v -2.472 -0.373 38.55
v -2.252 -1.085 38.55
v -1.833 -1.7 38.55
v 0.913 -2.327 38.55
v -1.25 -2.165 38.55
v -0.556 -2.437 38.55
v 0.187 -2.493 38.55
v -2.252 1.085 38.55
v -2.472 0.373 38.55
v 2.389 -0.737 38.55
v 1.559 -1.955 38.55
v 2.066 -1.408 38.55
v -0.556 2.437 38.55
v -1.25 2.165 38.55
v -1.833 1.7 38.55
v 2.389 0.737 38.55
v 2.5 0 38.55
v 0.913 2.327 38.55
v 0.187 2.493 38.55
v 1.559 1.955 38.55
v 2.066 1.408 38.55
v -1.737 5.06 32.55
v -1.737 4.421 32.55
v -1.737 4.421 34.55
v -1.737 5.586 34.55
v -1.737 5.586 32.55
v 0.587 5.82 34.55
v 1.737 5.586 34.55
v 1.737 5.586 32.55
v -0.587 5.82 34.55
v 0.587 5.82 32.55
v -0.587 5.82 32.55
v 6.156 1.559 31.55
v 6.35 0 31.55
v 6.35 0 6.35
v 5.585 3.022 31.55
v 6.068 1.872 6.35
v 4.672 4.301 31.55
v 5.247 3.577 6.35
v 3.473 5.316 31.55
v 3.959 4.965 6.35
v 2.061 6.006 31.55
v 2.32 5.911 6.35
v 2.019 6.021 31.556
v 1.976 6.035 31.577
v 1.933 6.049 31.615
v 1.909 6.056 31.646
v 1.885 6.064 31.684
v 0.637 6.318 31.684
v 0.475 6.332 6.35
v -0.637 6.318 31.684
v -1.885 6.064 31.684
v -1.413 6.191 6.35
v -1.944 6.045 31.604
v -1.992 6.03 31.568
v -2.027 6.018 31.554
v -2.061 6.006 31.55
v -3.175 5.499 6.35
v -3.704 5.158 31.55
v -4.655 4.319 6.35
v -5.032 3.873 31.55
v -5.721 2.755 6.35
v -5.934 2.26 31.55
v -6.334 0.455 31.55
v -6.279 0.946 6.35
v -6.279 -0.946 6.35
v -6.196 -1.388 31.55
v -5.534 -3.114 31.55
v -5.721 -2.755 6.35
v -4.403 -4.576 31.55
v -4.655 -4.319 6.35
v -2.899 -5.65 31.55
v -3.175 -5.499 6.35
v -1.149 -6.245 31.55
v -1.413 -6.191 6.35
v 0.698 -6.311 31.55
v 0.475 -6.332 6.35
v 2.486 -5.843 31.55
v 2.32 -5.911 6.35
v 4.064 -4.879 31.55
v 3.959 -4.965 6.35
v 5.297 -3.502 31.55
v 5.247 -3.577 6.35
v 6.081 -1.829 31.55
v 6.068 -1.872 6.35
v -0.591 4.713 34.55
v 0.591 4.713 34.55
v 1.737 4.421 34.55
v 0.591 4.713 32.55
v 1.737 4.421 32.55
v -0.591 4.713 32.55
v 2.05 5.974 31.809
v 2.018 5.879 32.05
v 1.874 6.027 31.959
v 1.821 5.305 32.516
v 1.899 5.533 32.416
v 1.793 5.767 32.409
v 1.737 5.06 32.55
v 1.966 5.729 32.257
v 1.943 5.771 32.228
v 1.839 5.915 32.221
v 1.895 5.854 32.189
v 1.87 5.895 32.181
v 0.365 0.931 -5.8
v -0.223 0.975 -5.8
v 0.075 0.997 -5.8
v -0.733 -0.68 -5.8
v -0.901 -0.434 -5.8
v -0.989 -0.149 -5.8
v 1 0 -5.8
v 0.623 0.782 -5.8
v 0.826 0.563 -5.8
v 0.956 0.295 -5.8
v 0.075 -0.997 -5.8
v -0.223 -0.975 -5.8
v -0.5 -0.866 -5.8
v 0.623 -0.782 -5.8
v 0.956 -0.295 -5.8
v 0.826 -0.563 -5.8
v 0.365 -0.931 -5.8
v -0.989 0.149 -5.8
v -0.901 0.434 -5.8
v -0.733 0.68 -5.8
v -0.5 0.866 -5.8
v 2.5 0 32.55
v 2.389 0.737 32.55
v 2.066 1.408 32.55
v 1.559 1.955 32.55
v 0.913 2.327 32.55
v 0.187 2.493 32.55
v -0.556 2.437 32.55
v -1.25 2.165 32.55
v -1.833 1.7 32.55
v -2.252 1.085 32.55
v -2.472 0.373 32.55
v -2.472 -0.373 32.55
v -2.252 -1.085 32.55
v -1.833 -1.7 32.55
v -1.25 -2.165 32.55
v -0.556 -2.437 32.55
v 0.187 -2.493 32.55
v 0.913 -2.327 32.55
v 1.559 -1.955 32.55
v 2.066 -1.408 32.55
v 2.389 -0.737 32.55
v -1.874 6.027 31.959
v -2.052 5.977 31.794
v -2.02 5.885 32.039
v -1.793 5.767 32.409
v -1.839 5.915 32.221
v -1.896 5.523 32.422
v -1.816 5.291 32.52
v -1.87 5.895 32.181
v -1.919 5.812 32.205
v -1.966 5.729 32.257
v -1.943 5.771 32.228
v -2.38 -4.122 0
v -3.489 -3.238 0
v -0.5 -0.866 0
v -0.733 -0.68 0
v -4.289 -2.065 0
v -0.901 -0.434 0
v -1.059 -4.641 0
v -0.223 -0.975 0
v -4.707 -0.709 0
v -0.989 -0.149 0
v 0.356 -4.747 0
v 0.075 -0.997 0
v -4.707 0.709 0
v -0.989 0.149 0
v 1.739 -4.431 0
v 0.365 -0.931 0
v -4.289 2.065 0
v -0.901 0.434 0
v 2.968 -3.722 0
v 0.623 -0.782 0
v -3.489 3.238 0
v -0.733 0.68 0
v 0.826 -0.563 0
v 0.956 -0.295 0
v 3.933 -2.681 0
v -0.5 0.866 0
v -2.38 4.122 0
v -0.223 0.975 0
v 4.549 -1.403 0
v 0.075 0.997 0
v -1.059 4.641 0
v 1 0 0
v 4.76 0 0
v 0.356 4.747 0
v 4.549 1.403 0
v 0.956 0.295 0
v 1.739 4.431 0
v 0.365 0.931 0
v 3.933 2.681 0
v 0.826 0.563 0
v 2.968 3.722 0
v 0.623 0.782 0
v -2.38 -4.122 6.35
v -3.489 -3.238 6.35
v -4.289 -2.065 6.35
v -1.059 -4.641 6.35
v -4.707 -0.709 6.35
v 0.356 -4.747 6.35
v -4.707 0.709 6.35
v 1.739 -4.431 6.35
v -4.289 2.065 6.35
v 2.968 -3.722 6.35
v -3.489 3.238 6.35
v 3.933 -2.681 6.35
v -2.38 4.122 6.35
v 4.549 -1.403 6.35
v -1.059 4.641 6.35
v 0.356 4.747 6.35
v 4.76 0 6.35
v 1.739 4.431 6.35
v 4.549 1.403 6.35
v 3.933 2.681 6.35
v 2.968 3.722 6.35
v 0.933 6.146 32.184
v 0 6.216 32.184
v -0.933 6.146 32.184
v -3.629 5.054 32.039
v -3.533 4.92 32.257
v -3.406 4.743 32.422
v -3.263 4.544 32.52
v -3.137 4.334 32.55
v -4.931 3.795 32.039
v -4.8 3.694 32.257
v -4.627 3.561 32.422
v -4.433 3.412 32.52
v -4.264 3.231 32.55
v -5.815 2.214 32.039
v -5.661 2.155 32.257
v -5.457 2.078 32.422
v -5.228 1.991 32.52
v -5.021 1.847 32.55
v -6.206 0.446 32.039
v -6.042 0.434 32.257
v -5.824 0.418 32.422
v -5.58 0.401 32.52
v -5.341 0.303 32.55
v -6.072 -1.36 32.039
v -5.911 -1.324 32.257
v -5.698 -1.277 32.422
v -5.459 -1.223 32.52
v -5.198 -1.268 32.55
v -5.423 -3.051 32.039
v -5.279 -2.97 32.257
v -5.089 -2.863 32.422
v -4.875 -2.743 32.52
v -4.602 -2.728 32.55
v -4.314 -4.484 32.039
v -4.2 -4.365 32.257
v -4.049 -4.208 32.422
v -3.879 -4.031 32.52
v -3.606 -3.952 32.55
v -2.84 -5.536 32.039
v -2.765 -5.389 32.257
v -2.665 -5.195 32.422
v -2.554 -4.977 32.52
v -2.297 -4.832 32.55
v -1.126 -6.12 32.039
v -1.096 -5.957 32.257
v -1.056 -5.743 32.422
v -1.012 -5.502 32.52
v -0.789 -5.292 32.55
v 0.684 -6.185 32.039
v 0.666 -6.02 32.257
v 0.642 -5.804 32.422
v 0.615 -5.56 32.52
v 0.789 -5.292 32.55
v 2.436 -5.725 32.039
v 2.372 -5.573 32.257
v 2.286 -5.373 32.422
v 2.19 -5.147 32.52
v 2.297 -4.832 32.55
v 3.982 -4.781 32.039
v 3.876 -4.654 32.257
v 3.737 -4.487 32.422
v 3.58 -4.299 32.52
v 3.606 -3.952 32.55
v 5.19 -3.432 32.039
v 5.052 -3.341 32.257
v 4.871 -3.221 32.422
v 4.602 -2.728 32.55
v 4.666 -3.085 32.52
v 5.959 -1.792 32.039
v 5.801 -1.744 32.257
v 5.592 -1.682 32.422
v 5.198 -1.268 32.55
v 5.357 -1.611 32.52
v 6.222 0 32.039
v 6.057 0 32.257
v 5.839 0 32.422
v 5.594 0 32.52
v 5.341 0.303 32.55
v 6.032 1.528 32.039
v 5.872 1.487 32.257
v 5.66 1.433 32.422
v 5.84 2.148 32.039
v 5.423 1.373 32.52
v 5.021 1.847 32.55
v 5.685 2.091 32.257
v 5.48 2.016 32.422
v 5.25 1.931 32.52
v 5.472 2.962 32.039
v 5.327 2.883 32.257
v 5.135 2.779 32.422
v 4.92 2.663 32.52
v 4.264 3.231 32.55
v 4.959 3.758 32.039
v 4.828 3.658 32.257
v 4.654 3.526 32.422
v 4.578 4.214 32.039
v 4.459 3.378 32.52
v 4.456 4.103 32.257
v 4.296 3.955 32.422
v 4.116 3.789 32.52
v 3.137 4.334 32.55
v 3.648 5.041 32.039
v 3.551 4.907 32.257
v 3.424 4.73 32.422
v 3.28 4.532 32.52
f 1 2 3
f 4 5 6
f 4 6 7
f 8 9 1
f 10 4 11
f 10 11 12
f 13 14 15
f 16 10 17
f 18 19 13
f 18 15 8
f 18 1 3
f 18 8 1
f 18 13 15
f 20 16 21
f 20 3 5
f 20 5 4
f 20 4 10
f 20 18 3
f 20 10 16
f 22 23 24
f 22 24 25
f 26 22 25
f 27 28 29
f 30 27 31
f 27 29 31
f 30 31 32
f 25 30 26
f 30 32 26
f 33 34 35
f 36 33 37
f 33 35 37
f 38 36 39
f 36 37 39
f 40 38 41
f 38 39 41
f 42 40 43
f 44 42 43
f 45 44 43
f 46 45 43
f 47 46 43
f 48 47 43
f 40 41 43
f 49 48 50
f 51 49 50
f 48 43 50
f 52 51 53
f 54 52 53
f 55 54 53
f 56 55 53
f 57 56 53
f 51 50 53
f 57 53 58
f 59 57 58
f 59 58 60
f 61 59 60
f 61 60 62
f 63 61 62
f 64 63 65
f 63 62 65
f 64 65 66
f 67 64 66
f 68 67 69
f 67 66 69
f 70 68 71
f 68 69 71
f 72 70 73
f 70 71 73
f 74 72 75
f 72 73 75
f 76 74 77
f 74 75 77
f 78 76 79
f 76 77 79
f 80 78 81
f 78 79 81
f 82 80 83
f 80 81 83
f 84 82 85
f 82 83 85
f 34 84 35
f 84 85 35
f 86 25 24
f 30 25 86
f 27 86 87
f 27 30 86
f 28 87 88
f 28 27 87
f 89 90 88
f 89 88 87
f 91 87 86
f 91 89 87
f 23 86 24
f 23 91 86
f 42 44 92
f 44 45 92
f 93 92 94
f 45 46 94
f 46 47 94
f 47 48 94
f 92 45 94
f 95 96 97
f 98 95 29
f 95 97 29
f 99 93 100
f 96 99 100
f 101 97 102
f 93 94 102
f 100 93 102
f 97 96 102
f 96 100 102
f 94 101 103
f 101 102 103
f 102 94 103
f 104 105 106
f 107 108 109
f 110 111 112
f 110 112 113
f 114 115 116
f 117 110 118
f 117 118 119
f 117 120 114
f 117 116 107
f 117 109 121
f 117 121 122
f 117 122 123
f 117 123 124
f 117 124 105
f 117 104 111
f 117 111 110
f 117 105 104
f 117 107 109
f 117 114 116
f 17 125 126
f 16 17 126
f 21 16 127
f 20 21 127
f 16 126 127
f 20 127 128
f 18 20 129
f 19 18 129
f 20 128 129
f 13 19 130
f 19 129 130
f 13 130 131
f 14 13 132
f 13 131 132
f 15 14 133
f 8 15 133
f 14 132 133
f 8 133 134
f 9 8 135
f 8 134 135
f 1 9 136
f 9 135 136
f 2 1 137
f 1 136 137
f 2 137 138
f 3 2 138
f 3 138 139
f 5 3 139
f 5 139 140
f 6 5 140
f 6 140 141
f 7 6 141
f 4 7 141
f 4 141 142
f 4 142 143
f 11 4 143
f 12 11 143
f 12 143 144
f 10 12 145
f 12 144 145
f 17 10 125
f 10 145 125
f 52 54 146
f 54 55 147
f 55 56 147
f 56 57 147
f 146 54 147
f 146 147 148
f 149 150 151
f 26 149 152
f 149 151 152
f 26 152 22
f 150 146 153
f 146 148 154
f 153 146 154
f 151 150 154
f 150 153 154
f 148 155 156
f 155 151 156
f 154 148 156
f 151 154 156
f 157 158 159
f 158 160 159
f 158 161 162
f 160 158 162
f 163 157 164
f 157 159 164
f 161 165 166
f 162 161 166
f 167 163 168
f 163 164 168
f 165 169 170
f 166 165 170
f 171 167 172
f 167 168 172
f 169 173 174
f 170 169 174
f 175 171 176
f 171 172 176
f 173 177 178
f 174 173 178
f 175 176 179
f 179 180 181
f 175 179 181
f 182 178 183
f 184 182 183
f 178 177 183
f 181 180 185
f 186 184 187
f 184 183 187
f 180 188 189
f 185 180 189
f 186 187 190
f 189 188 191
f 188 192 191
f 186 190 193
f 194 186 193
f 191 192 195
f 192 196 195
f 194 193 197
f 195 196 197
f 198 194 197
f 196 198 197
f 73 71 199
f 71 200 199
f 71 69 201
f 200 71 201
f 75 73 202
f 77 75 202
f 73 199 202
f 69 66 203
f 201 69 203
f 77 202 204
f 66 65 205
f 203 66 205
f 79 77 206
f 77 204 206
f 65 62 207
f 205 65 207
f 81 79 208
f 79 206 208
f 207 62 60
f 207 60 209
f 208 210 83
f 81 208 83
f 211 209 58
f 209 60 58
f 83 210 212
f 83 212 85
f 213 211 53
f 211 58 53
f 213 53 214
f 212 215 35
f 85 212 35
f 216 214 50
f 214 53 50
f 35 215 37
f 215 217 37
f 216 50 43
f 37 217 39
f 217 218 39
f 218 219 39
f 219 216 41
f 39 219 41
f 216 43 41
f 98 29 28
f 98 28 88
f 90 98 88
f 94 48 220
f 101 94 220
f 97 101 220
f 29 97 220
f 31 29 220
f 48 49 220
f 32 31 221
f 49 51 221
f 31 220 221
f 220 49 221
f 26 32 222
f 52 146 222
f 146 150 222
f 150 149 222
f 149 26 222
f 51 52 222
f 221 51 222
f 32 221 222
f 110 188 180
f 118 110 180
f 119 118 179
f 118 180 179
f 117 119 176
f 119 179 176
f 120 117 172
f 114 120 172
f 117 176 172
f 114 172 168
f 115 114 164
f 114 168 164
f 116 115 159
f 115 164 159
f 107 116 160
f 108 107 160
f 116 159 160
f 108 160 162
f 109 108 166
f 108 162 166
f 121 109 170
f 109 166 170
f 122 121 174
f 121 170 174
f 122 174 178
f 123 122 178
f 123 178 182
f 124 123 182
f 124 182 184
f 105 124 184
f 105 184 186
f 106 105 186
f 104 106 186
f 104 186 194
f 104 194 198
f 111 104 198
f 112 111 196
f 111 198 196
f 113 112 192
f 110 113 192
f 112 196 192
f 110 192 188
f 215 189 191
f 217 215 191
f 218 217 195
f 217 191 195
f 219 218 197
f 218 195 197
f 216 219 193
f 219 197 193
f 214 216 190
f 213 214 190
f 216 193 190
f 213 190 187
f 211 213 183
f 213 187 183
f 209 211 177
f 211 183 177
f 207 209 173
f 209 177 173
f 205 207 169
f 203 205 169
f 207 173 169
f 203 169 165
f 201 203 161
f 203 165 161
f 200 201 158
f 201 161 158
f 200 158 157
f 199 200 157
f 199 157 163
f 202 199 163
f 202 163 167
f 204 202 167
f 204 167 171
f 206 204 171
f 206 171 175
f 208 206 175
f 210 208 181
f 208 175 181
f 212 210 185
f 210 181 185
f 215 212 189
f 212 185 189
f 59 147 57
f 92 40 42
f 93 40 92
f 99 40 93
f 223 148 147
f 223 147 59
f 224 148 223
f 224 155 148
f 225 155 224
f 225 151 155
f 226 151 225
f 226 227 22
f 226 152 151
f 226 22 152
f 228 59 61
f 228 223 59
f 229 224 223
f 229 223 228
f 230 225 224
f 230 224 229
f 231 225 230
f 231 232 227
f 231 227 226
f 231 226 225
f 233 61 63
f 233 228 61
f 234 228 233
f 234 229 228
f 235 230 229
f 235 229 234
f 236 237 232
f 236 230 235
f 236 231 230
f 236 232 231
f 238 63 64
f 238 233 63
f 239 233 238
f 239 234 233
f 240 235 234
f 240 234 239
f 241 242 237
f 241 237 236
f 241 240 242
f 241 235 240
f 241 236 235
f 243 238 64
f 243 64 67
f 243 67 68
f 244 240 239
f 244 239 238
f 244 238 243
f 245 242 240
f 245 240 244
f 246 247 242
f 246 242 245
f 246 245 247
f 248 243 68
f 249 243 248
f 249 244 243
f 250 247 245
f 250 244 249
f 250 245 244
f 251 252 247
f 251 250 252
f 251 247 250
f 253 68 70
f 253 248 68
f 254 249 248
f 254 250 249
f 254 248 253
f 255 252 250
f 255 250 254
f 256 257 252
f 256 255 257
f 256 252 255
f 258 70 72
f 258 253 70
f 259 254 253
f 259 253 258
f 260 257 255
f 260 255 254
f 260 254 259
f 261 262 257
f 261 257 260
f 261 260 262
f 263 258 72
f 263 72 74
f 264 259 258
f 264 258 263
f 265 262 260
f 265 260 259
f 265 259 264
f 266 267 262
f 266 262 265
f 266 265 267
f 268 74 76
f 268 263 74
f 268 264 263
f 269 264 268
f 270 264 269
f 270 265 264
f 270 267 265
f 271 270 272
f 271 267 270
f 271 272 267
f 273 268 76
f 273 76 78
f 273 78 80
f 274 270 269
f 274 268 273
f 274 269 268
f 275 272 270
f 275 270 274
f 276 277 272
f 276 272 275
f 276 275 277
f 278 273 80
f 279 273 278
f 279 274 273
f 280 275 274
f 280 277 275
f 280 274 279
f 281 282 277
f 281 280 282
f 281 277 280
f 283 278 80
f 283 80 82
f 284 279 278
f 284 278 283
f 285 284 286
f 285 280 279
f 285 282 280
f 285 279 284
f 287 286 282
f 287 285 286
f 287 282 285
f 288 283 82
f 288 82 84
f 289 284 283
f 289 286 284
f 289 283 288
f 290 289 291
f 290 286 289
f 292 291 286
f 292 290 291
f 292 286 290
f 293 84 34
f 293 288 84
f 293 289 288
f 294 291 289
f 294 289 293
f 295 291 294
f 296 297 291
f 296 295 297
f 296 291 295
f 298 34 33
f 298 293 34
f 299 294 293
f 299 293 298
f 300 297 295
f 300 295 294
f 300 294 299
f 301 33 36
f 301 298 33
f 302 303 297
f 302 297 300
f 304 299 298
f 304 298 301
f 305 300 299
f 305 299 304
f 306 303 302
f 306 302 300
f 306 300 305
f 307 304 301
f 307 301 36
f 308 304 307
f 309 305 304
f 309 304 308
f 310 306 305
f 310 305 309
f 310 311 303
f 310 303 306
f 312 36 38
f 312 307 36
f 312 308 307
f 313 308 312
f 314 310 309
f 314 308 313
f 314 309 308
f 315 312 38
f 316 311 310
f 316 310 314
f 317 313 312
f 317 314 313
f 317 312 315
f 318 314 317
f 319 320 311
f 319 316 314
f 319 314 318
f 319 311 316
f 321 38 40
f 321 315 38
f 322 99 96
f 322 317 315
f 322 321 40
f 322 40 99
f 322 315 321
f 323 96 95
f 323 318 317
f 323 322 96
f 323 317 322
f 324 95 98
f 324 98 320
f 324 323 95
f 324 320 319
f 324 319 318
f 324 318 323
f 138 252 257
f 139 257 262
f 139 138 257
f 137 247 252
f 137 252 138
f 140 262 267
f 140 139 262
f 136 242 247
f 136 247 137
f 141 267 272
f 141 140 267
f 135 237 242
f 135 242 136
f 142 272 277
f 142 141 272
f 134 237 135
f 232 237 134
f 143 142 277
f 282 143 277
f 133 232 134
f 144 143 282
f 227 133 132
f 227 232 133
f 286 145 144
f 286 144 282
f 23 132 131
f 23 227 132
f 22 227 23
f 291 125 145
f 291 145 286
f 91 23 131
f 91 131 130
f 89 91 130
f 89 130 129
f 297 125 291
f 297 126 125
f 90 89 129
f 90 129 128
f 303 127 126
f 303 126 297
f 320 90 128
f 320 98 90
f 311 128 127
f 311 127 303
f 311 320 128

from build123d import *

# Parameters (mm, degrees)
SKETCH_R     = 4.76
PAD_DEPTH    = 6.35
SKETCH001_R  = 6.35
PAD001_DEPTH = 26.2
SKETCH002_R  = 1
PAD002_DEPTH = 5.8
SKETCH003_R  = 2.5
PAD003_DEPTH = 6
PAD004_DEPTH = 2
FILLET_R     = 1


with BuildPart() as part:
    # Sketch → Pad (new body)
    with BuildSketch(Plane.XY):
        Circle(SKETCH_R)
    extrude(amount=PAD_DEPTH)

    # Sketch001 (on Face3 of Pad) → Pad001 (join)
    with BuildSketch(Plane.XY.offset(6.35)):
        Circle(SKETCH001_R)
    extrude(amount=PAD001_DEPTH)

    # Sketch002 (on Face5 of Pad001) → Pad002 (join)
    with BuildSketch(Plane(origin=(0, 0, 0), x_dir=(1, 0, 0), z_dir=(0, 0, -1))):
        Circle(SKETCH002_R)
    extrude(amount=PAD002_DEPTH)

    # Sketch003 (on Face3 of Pad002) → Pad003 (join)
    with BuildSketch(Plane.XY.offset(32.55)):
        Circle(SKETCH003_R)
    extrude(amount=PAD003_DEPTH)

    # Sketch004 (on Face3 of Pad003) → Pad004 (join)
    with BuildSketch(Plane.XY.offset(32.55)):
        with BuildLine():
            ThreePointArc((1.736759, 5.586248), (0, 5.85), (-1.736759, 5.586248))
            Line((-1.736759, 4.421105), (-1.736759, 5.586248))
            ThreePointArc((1.736759, 4.421105), (0, 4.75), (-1.736759, 4.421105))
            Line((1.736759, 5.586248), (1.736759, 4.421105))
        make_face()
    extrude(amount=PAD004_DEPTH)

    # Fillet
    fillet_edges = [part.edges().sort_by_distance(p)[0] for p in [
        (-6.35, 0, 32.55),
    ]]
    fillet(fillet_edges, radius=FILLET_R)


solid = part.part
